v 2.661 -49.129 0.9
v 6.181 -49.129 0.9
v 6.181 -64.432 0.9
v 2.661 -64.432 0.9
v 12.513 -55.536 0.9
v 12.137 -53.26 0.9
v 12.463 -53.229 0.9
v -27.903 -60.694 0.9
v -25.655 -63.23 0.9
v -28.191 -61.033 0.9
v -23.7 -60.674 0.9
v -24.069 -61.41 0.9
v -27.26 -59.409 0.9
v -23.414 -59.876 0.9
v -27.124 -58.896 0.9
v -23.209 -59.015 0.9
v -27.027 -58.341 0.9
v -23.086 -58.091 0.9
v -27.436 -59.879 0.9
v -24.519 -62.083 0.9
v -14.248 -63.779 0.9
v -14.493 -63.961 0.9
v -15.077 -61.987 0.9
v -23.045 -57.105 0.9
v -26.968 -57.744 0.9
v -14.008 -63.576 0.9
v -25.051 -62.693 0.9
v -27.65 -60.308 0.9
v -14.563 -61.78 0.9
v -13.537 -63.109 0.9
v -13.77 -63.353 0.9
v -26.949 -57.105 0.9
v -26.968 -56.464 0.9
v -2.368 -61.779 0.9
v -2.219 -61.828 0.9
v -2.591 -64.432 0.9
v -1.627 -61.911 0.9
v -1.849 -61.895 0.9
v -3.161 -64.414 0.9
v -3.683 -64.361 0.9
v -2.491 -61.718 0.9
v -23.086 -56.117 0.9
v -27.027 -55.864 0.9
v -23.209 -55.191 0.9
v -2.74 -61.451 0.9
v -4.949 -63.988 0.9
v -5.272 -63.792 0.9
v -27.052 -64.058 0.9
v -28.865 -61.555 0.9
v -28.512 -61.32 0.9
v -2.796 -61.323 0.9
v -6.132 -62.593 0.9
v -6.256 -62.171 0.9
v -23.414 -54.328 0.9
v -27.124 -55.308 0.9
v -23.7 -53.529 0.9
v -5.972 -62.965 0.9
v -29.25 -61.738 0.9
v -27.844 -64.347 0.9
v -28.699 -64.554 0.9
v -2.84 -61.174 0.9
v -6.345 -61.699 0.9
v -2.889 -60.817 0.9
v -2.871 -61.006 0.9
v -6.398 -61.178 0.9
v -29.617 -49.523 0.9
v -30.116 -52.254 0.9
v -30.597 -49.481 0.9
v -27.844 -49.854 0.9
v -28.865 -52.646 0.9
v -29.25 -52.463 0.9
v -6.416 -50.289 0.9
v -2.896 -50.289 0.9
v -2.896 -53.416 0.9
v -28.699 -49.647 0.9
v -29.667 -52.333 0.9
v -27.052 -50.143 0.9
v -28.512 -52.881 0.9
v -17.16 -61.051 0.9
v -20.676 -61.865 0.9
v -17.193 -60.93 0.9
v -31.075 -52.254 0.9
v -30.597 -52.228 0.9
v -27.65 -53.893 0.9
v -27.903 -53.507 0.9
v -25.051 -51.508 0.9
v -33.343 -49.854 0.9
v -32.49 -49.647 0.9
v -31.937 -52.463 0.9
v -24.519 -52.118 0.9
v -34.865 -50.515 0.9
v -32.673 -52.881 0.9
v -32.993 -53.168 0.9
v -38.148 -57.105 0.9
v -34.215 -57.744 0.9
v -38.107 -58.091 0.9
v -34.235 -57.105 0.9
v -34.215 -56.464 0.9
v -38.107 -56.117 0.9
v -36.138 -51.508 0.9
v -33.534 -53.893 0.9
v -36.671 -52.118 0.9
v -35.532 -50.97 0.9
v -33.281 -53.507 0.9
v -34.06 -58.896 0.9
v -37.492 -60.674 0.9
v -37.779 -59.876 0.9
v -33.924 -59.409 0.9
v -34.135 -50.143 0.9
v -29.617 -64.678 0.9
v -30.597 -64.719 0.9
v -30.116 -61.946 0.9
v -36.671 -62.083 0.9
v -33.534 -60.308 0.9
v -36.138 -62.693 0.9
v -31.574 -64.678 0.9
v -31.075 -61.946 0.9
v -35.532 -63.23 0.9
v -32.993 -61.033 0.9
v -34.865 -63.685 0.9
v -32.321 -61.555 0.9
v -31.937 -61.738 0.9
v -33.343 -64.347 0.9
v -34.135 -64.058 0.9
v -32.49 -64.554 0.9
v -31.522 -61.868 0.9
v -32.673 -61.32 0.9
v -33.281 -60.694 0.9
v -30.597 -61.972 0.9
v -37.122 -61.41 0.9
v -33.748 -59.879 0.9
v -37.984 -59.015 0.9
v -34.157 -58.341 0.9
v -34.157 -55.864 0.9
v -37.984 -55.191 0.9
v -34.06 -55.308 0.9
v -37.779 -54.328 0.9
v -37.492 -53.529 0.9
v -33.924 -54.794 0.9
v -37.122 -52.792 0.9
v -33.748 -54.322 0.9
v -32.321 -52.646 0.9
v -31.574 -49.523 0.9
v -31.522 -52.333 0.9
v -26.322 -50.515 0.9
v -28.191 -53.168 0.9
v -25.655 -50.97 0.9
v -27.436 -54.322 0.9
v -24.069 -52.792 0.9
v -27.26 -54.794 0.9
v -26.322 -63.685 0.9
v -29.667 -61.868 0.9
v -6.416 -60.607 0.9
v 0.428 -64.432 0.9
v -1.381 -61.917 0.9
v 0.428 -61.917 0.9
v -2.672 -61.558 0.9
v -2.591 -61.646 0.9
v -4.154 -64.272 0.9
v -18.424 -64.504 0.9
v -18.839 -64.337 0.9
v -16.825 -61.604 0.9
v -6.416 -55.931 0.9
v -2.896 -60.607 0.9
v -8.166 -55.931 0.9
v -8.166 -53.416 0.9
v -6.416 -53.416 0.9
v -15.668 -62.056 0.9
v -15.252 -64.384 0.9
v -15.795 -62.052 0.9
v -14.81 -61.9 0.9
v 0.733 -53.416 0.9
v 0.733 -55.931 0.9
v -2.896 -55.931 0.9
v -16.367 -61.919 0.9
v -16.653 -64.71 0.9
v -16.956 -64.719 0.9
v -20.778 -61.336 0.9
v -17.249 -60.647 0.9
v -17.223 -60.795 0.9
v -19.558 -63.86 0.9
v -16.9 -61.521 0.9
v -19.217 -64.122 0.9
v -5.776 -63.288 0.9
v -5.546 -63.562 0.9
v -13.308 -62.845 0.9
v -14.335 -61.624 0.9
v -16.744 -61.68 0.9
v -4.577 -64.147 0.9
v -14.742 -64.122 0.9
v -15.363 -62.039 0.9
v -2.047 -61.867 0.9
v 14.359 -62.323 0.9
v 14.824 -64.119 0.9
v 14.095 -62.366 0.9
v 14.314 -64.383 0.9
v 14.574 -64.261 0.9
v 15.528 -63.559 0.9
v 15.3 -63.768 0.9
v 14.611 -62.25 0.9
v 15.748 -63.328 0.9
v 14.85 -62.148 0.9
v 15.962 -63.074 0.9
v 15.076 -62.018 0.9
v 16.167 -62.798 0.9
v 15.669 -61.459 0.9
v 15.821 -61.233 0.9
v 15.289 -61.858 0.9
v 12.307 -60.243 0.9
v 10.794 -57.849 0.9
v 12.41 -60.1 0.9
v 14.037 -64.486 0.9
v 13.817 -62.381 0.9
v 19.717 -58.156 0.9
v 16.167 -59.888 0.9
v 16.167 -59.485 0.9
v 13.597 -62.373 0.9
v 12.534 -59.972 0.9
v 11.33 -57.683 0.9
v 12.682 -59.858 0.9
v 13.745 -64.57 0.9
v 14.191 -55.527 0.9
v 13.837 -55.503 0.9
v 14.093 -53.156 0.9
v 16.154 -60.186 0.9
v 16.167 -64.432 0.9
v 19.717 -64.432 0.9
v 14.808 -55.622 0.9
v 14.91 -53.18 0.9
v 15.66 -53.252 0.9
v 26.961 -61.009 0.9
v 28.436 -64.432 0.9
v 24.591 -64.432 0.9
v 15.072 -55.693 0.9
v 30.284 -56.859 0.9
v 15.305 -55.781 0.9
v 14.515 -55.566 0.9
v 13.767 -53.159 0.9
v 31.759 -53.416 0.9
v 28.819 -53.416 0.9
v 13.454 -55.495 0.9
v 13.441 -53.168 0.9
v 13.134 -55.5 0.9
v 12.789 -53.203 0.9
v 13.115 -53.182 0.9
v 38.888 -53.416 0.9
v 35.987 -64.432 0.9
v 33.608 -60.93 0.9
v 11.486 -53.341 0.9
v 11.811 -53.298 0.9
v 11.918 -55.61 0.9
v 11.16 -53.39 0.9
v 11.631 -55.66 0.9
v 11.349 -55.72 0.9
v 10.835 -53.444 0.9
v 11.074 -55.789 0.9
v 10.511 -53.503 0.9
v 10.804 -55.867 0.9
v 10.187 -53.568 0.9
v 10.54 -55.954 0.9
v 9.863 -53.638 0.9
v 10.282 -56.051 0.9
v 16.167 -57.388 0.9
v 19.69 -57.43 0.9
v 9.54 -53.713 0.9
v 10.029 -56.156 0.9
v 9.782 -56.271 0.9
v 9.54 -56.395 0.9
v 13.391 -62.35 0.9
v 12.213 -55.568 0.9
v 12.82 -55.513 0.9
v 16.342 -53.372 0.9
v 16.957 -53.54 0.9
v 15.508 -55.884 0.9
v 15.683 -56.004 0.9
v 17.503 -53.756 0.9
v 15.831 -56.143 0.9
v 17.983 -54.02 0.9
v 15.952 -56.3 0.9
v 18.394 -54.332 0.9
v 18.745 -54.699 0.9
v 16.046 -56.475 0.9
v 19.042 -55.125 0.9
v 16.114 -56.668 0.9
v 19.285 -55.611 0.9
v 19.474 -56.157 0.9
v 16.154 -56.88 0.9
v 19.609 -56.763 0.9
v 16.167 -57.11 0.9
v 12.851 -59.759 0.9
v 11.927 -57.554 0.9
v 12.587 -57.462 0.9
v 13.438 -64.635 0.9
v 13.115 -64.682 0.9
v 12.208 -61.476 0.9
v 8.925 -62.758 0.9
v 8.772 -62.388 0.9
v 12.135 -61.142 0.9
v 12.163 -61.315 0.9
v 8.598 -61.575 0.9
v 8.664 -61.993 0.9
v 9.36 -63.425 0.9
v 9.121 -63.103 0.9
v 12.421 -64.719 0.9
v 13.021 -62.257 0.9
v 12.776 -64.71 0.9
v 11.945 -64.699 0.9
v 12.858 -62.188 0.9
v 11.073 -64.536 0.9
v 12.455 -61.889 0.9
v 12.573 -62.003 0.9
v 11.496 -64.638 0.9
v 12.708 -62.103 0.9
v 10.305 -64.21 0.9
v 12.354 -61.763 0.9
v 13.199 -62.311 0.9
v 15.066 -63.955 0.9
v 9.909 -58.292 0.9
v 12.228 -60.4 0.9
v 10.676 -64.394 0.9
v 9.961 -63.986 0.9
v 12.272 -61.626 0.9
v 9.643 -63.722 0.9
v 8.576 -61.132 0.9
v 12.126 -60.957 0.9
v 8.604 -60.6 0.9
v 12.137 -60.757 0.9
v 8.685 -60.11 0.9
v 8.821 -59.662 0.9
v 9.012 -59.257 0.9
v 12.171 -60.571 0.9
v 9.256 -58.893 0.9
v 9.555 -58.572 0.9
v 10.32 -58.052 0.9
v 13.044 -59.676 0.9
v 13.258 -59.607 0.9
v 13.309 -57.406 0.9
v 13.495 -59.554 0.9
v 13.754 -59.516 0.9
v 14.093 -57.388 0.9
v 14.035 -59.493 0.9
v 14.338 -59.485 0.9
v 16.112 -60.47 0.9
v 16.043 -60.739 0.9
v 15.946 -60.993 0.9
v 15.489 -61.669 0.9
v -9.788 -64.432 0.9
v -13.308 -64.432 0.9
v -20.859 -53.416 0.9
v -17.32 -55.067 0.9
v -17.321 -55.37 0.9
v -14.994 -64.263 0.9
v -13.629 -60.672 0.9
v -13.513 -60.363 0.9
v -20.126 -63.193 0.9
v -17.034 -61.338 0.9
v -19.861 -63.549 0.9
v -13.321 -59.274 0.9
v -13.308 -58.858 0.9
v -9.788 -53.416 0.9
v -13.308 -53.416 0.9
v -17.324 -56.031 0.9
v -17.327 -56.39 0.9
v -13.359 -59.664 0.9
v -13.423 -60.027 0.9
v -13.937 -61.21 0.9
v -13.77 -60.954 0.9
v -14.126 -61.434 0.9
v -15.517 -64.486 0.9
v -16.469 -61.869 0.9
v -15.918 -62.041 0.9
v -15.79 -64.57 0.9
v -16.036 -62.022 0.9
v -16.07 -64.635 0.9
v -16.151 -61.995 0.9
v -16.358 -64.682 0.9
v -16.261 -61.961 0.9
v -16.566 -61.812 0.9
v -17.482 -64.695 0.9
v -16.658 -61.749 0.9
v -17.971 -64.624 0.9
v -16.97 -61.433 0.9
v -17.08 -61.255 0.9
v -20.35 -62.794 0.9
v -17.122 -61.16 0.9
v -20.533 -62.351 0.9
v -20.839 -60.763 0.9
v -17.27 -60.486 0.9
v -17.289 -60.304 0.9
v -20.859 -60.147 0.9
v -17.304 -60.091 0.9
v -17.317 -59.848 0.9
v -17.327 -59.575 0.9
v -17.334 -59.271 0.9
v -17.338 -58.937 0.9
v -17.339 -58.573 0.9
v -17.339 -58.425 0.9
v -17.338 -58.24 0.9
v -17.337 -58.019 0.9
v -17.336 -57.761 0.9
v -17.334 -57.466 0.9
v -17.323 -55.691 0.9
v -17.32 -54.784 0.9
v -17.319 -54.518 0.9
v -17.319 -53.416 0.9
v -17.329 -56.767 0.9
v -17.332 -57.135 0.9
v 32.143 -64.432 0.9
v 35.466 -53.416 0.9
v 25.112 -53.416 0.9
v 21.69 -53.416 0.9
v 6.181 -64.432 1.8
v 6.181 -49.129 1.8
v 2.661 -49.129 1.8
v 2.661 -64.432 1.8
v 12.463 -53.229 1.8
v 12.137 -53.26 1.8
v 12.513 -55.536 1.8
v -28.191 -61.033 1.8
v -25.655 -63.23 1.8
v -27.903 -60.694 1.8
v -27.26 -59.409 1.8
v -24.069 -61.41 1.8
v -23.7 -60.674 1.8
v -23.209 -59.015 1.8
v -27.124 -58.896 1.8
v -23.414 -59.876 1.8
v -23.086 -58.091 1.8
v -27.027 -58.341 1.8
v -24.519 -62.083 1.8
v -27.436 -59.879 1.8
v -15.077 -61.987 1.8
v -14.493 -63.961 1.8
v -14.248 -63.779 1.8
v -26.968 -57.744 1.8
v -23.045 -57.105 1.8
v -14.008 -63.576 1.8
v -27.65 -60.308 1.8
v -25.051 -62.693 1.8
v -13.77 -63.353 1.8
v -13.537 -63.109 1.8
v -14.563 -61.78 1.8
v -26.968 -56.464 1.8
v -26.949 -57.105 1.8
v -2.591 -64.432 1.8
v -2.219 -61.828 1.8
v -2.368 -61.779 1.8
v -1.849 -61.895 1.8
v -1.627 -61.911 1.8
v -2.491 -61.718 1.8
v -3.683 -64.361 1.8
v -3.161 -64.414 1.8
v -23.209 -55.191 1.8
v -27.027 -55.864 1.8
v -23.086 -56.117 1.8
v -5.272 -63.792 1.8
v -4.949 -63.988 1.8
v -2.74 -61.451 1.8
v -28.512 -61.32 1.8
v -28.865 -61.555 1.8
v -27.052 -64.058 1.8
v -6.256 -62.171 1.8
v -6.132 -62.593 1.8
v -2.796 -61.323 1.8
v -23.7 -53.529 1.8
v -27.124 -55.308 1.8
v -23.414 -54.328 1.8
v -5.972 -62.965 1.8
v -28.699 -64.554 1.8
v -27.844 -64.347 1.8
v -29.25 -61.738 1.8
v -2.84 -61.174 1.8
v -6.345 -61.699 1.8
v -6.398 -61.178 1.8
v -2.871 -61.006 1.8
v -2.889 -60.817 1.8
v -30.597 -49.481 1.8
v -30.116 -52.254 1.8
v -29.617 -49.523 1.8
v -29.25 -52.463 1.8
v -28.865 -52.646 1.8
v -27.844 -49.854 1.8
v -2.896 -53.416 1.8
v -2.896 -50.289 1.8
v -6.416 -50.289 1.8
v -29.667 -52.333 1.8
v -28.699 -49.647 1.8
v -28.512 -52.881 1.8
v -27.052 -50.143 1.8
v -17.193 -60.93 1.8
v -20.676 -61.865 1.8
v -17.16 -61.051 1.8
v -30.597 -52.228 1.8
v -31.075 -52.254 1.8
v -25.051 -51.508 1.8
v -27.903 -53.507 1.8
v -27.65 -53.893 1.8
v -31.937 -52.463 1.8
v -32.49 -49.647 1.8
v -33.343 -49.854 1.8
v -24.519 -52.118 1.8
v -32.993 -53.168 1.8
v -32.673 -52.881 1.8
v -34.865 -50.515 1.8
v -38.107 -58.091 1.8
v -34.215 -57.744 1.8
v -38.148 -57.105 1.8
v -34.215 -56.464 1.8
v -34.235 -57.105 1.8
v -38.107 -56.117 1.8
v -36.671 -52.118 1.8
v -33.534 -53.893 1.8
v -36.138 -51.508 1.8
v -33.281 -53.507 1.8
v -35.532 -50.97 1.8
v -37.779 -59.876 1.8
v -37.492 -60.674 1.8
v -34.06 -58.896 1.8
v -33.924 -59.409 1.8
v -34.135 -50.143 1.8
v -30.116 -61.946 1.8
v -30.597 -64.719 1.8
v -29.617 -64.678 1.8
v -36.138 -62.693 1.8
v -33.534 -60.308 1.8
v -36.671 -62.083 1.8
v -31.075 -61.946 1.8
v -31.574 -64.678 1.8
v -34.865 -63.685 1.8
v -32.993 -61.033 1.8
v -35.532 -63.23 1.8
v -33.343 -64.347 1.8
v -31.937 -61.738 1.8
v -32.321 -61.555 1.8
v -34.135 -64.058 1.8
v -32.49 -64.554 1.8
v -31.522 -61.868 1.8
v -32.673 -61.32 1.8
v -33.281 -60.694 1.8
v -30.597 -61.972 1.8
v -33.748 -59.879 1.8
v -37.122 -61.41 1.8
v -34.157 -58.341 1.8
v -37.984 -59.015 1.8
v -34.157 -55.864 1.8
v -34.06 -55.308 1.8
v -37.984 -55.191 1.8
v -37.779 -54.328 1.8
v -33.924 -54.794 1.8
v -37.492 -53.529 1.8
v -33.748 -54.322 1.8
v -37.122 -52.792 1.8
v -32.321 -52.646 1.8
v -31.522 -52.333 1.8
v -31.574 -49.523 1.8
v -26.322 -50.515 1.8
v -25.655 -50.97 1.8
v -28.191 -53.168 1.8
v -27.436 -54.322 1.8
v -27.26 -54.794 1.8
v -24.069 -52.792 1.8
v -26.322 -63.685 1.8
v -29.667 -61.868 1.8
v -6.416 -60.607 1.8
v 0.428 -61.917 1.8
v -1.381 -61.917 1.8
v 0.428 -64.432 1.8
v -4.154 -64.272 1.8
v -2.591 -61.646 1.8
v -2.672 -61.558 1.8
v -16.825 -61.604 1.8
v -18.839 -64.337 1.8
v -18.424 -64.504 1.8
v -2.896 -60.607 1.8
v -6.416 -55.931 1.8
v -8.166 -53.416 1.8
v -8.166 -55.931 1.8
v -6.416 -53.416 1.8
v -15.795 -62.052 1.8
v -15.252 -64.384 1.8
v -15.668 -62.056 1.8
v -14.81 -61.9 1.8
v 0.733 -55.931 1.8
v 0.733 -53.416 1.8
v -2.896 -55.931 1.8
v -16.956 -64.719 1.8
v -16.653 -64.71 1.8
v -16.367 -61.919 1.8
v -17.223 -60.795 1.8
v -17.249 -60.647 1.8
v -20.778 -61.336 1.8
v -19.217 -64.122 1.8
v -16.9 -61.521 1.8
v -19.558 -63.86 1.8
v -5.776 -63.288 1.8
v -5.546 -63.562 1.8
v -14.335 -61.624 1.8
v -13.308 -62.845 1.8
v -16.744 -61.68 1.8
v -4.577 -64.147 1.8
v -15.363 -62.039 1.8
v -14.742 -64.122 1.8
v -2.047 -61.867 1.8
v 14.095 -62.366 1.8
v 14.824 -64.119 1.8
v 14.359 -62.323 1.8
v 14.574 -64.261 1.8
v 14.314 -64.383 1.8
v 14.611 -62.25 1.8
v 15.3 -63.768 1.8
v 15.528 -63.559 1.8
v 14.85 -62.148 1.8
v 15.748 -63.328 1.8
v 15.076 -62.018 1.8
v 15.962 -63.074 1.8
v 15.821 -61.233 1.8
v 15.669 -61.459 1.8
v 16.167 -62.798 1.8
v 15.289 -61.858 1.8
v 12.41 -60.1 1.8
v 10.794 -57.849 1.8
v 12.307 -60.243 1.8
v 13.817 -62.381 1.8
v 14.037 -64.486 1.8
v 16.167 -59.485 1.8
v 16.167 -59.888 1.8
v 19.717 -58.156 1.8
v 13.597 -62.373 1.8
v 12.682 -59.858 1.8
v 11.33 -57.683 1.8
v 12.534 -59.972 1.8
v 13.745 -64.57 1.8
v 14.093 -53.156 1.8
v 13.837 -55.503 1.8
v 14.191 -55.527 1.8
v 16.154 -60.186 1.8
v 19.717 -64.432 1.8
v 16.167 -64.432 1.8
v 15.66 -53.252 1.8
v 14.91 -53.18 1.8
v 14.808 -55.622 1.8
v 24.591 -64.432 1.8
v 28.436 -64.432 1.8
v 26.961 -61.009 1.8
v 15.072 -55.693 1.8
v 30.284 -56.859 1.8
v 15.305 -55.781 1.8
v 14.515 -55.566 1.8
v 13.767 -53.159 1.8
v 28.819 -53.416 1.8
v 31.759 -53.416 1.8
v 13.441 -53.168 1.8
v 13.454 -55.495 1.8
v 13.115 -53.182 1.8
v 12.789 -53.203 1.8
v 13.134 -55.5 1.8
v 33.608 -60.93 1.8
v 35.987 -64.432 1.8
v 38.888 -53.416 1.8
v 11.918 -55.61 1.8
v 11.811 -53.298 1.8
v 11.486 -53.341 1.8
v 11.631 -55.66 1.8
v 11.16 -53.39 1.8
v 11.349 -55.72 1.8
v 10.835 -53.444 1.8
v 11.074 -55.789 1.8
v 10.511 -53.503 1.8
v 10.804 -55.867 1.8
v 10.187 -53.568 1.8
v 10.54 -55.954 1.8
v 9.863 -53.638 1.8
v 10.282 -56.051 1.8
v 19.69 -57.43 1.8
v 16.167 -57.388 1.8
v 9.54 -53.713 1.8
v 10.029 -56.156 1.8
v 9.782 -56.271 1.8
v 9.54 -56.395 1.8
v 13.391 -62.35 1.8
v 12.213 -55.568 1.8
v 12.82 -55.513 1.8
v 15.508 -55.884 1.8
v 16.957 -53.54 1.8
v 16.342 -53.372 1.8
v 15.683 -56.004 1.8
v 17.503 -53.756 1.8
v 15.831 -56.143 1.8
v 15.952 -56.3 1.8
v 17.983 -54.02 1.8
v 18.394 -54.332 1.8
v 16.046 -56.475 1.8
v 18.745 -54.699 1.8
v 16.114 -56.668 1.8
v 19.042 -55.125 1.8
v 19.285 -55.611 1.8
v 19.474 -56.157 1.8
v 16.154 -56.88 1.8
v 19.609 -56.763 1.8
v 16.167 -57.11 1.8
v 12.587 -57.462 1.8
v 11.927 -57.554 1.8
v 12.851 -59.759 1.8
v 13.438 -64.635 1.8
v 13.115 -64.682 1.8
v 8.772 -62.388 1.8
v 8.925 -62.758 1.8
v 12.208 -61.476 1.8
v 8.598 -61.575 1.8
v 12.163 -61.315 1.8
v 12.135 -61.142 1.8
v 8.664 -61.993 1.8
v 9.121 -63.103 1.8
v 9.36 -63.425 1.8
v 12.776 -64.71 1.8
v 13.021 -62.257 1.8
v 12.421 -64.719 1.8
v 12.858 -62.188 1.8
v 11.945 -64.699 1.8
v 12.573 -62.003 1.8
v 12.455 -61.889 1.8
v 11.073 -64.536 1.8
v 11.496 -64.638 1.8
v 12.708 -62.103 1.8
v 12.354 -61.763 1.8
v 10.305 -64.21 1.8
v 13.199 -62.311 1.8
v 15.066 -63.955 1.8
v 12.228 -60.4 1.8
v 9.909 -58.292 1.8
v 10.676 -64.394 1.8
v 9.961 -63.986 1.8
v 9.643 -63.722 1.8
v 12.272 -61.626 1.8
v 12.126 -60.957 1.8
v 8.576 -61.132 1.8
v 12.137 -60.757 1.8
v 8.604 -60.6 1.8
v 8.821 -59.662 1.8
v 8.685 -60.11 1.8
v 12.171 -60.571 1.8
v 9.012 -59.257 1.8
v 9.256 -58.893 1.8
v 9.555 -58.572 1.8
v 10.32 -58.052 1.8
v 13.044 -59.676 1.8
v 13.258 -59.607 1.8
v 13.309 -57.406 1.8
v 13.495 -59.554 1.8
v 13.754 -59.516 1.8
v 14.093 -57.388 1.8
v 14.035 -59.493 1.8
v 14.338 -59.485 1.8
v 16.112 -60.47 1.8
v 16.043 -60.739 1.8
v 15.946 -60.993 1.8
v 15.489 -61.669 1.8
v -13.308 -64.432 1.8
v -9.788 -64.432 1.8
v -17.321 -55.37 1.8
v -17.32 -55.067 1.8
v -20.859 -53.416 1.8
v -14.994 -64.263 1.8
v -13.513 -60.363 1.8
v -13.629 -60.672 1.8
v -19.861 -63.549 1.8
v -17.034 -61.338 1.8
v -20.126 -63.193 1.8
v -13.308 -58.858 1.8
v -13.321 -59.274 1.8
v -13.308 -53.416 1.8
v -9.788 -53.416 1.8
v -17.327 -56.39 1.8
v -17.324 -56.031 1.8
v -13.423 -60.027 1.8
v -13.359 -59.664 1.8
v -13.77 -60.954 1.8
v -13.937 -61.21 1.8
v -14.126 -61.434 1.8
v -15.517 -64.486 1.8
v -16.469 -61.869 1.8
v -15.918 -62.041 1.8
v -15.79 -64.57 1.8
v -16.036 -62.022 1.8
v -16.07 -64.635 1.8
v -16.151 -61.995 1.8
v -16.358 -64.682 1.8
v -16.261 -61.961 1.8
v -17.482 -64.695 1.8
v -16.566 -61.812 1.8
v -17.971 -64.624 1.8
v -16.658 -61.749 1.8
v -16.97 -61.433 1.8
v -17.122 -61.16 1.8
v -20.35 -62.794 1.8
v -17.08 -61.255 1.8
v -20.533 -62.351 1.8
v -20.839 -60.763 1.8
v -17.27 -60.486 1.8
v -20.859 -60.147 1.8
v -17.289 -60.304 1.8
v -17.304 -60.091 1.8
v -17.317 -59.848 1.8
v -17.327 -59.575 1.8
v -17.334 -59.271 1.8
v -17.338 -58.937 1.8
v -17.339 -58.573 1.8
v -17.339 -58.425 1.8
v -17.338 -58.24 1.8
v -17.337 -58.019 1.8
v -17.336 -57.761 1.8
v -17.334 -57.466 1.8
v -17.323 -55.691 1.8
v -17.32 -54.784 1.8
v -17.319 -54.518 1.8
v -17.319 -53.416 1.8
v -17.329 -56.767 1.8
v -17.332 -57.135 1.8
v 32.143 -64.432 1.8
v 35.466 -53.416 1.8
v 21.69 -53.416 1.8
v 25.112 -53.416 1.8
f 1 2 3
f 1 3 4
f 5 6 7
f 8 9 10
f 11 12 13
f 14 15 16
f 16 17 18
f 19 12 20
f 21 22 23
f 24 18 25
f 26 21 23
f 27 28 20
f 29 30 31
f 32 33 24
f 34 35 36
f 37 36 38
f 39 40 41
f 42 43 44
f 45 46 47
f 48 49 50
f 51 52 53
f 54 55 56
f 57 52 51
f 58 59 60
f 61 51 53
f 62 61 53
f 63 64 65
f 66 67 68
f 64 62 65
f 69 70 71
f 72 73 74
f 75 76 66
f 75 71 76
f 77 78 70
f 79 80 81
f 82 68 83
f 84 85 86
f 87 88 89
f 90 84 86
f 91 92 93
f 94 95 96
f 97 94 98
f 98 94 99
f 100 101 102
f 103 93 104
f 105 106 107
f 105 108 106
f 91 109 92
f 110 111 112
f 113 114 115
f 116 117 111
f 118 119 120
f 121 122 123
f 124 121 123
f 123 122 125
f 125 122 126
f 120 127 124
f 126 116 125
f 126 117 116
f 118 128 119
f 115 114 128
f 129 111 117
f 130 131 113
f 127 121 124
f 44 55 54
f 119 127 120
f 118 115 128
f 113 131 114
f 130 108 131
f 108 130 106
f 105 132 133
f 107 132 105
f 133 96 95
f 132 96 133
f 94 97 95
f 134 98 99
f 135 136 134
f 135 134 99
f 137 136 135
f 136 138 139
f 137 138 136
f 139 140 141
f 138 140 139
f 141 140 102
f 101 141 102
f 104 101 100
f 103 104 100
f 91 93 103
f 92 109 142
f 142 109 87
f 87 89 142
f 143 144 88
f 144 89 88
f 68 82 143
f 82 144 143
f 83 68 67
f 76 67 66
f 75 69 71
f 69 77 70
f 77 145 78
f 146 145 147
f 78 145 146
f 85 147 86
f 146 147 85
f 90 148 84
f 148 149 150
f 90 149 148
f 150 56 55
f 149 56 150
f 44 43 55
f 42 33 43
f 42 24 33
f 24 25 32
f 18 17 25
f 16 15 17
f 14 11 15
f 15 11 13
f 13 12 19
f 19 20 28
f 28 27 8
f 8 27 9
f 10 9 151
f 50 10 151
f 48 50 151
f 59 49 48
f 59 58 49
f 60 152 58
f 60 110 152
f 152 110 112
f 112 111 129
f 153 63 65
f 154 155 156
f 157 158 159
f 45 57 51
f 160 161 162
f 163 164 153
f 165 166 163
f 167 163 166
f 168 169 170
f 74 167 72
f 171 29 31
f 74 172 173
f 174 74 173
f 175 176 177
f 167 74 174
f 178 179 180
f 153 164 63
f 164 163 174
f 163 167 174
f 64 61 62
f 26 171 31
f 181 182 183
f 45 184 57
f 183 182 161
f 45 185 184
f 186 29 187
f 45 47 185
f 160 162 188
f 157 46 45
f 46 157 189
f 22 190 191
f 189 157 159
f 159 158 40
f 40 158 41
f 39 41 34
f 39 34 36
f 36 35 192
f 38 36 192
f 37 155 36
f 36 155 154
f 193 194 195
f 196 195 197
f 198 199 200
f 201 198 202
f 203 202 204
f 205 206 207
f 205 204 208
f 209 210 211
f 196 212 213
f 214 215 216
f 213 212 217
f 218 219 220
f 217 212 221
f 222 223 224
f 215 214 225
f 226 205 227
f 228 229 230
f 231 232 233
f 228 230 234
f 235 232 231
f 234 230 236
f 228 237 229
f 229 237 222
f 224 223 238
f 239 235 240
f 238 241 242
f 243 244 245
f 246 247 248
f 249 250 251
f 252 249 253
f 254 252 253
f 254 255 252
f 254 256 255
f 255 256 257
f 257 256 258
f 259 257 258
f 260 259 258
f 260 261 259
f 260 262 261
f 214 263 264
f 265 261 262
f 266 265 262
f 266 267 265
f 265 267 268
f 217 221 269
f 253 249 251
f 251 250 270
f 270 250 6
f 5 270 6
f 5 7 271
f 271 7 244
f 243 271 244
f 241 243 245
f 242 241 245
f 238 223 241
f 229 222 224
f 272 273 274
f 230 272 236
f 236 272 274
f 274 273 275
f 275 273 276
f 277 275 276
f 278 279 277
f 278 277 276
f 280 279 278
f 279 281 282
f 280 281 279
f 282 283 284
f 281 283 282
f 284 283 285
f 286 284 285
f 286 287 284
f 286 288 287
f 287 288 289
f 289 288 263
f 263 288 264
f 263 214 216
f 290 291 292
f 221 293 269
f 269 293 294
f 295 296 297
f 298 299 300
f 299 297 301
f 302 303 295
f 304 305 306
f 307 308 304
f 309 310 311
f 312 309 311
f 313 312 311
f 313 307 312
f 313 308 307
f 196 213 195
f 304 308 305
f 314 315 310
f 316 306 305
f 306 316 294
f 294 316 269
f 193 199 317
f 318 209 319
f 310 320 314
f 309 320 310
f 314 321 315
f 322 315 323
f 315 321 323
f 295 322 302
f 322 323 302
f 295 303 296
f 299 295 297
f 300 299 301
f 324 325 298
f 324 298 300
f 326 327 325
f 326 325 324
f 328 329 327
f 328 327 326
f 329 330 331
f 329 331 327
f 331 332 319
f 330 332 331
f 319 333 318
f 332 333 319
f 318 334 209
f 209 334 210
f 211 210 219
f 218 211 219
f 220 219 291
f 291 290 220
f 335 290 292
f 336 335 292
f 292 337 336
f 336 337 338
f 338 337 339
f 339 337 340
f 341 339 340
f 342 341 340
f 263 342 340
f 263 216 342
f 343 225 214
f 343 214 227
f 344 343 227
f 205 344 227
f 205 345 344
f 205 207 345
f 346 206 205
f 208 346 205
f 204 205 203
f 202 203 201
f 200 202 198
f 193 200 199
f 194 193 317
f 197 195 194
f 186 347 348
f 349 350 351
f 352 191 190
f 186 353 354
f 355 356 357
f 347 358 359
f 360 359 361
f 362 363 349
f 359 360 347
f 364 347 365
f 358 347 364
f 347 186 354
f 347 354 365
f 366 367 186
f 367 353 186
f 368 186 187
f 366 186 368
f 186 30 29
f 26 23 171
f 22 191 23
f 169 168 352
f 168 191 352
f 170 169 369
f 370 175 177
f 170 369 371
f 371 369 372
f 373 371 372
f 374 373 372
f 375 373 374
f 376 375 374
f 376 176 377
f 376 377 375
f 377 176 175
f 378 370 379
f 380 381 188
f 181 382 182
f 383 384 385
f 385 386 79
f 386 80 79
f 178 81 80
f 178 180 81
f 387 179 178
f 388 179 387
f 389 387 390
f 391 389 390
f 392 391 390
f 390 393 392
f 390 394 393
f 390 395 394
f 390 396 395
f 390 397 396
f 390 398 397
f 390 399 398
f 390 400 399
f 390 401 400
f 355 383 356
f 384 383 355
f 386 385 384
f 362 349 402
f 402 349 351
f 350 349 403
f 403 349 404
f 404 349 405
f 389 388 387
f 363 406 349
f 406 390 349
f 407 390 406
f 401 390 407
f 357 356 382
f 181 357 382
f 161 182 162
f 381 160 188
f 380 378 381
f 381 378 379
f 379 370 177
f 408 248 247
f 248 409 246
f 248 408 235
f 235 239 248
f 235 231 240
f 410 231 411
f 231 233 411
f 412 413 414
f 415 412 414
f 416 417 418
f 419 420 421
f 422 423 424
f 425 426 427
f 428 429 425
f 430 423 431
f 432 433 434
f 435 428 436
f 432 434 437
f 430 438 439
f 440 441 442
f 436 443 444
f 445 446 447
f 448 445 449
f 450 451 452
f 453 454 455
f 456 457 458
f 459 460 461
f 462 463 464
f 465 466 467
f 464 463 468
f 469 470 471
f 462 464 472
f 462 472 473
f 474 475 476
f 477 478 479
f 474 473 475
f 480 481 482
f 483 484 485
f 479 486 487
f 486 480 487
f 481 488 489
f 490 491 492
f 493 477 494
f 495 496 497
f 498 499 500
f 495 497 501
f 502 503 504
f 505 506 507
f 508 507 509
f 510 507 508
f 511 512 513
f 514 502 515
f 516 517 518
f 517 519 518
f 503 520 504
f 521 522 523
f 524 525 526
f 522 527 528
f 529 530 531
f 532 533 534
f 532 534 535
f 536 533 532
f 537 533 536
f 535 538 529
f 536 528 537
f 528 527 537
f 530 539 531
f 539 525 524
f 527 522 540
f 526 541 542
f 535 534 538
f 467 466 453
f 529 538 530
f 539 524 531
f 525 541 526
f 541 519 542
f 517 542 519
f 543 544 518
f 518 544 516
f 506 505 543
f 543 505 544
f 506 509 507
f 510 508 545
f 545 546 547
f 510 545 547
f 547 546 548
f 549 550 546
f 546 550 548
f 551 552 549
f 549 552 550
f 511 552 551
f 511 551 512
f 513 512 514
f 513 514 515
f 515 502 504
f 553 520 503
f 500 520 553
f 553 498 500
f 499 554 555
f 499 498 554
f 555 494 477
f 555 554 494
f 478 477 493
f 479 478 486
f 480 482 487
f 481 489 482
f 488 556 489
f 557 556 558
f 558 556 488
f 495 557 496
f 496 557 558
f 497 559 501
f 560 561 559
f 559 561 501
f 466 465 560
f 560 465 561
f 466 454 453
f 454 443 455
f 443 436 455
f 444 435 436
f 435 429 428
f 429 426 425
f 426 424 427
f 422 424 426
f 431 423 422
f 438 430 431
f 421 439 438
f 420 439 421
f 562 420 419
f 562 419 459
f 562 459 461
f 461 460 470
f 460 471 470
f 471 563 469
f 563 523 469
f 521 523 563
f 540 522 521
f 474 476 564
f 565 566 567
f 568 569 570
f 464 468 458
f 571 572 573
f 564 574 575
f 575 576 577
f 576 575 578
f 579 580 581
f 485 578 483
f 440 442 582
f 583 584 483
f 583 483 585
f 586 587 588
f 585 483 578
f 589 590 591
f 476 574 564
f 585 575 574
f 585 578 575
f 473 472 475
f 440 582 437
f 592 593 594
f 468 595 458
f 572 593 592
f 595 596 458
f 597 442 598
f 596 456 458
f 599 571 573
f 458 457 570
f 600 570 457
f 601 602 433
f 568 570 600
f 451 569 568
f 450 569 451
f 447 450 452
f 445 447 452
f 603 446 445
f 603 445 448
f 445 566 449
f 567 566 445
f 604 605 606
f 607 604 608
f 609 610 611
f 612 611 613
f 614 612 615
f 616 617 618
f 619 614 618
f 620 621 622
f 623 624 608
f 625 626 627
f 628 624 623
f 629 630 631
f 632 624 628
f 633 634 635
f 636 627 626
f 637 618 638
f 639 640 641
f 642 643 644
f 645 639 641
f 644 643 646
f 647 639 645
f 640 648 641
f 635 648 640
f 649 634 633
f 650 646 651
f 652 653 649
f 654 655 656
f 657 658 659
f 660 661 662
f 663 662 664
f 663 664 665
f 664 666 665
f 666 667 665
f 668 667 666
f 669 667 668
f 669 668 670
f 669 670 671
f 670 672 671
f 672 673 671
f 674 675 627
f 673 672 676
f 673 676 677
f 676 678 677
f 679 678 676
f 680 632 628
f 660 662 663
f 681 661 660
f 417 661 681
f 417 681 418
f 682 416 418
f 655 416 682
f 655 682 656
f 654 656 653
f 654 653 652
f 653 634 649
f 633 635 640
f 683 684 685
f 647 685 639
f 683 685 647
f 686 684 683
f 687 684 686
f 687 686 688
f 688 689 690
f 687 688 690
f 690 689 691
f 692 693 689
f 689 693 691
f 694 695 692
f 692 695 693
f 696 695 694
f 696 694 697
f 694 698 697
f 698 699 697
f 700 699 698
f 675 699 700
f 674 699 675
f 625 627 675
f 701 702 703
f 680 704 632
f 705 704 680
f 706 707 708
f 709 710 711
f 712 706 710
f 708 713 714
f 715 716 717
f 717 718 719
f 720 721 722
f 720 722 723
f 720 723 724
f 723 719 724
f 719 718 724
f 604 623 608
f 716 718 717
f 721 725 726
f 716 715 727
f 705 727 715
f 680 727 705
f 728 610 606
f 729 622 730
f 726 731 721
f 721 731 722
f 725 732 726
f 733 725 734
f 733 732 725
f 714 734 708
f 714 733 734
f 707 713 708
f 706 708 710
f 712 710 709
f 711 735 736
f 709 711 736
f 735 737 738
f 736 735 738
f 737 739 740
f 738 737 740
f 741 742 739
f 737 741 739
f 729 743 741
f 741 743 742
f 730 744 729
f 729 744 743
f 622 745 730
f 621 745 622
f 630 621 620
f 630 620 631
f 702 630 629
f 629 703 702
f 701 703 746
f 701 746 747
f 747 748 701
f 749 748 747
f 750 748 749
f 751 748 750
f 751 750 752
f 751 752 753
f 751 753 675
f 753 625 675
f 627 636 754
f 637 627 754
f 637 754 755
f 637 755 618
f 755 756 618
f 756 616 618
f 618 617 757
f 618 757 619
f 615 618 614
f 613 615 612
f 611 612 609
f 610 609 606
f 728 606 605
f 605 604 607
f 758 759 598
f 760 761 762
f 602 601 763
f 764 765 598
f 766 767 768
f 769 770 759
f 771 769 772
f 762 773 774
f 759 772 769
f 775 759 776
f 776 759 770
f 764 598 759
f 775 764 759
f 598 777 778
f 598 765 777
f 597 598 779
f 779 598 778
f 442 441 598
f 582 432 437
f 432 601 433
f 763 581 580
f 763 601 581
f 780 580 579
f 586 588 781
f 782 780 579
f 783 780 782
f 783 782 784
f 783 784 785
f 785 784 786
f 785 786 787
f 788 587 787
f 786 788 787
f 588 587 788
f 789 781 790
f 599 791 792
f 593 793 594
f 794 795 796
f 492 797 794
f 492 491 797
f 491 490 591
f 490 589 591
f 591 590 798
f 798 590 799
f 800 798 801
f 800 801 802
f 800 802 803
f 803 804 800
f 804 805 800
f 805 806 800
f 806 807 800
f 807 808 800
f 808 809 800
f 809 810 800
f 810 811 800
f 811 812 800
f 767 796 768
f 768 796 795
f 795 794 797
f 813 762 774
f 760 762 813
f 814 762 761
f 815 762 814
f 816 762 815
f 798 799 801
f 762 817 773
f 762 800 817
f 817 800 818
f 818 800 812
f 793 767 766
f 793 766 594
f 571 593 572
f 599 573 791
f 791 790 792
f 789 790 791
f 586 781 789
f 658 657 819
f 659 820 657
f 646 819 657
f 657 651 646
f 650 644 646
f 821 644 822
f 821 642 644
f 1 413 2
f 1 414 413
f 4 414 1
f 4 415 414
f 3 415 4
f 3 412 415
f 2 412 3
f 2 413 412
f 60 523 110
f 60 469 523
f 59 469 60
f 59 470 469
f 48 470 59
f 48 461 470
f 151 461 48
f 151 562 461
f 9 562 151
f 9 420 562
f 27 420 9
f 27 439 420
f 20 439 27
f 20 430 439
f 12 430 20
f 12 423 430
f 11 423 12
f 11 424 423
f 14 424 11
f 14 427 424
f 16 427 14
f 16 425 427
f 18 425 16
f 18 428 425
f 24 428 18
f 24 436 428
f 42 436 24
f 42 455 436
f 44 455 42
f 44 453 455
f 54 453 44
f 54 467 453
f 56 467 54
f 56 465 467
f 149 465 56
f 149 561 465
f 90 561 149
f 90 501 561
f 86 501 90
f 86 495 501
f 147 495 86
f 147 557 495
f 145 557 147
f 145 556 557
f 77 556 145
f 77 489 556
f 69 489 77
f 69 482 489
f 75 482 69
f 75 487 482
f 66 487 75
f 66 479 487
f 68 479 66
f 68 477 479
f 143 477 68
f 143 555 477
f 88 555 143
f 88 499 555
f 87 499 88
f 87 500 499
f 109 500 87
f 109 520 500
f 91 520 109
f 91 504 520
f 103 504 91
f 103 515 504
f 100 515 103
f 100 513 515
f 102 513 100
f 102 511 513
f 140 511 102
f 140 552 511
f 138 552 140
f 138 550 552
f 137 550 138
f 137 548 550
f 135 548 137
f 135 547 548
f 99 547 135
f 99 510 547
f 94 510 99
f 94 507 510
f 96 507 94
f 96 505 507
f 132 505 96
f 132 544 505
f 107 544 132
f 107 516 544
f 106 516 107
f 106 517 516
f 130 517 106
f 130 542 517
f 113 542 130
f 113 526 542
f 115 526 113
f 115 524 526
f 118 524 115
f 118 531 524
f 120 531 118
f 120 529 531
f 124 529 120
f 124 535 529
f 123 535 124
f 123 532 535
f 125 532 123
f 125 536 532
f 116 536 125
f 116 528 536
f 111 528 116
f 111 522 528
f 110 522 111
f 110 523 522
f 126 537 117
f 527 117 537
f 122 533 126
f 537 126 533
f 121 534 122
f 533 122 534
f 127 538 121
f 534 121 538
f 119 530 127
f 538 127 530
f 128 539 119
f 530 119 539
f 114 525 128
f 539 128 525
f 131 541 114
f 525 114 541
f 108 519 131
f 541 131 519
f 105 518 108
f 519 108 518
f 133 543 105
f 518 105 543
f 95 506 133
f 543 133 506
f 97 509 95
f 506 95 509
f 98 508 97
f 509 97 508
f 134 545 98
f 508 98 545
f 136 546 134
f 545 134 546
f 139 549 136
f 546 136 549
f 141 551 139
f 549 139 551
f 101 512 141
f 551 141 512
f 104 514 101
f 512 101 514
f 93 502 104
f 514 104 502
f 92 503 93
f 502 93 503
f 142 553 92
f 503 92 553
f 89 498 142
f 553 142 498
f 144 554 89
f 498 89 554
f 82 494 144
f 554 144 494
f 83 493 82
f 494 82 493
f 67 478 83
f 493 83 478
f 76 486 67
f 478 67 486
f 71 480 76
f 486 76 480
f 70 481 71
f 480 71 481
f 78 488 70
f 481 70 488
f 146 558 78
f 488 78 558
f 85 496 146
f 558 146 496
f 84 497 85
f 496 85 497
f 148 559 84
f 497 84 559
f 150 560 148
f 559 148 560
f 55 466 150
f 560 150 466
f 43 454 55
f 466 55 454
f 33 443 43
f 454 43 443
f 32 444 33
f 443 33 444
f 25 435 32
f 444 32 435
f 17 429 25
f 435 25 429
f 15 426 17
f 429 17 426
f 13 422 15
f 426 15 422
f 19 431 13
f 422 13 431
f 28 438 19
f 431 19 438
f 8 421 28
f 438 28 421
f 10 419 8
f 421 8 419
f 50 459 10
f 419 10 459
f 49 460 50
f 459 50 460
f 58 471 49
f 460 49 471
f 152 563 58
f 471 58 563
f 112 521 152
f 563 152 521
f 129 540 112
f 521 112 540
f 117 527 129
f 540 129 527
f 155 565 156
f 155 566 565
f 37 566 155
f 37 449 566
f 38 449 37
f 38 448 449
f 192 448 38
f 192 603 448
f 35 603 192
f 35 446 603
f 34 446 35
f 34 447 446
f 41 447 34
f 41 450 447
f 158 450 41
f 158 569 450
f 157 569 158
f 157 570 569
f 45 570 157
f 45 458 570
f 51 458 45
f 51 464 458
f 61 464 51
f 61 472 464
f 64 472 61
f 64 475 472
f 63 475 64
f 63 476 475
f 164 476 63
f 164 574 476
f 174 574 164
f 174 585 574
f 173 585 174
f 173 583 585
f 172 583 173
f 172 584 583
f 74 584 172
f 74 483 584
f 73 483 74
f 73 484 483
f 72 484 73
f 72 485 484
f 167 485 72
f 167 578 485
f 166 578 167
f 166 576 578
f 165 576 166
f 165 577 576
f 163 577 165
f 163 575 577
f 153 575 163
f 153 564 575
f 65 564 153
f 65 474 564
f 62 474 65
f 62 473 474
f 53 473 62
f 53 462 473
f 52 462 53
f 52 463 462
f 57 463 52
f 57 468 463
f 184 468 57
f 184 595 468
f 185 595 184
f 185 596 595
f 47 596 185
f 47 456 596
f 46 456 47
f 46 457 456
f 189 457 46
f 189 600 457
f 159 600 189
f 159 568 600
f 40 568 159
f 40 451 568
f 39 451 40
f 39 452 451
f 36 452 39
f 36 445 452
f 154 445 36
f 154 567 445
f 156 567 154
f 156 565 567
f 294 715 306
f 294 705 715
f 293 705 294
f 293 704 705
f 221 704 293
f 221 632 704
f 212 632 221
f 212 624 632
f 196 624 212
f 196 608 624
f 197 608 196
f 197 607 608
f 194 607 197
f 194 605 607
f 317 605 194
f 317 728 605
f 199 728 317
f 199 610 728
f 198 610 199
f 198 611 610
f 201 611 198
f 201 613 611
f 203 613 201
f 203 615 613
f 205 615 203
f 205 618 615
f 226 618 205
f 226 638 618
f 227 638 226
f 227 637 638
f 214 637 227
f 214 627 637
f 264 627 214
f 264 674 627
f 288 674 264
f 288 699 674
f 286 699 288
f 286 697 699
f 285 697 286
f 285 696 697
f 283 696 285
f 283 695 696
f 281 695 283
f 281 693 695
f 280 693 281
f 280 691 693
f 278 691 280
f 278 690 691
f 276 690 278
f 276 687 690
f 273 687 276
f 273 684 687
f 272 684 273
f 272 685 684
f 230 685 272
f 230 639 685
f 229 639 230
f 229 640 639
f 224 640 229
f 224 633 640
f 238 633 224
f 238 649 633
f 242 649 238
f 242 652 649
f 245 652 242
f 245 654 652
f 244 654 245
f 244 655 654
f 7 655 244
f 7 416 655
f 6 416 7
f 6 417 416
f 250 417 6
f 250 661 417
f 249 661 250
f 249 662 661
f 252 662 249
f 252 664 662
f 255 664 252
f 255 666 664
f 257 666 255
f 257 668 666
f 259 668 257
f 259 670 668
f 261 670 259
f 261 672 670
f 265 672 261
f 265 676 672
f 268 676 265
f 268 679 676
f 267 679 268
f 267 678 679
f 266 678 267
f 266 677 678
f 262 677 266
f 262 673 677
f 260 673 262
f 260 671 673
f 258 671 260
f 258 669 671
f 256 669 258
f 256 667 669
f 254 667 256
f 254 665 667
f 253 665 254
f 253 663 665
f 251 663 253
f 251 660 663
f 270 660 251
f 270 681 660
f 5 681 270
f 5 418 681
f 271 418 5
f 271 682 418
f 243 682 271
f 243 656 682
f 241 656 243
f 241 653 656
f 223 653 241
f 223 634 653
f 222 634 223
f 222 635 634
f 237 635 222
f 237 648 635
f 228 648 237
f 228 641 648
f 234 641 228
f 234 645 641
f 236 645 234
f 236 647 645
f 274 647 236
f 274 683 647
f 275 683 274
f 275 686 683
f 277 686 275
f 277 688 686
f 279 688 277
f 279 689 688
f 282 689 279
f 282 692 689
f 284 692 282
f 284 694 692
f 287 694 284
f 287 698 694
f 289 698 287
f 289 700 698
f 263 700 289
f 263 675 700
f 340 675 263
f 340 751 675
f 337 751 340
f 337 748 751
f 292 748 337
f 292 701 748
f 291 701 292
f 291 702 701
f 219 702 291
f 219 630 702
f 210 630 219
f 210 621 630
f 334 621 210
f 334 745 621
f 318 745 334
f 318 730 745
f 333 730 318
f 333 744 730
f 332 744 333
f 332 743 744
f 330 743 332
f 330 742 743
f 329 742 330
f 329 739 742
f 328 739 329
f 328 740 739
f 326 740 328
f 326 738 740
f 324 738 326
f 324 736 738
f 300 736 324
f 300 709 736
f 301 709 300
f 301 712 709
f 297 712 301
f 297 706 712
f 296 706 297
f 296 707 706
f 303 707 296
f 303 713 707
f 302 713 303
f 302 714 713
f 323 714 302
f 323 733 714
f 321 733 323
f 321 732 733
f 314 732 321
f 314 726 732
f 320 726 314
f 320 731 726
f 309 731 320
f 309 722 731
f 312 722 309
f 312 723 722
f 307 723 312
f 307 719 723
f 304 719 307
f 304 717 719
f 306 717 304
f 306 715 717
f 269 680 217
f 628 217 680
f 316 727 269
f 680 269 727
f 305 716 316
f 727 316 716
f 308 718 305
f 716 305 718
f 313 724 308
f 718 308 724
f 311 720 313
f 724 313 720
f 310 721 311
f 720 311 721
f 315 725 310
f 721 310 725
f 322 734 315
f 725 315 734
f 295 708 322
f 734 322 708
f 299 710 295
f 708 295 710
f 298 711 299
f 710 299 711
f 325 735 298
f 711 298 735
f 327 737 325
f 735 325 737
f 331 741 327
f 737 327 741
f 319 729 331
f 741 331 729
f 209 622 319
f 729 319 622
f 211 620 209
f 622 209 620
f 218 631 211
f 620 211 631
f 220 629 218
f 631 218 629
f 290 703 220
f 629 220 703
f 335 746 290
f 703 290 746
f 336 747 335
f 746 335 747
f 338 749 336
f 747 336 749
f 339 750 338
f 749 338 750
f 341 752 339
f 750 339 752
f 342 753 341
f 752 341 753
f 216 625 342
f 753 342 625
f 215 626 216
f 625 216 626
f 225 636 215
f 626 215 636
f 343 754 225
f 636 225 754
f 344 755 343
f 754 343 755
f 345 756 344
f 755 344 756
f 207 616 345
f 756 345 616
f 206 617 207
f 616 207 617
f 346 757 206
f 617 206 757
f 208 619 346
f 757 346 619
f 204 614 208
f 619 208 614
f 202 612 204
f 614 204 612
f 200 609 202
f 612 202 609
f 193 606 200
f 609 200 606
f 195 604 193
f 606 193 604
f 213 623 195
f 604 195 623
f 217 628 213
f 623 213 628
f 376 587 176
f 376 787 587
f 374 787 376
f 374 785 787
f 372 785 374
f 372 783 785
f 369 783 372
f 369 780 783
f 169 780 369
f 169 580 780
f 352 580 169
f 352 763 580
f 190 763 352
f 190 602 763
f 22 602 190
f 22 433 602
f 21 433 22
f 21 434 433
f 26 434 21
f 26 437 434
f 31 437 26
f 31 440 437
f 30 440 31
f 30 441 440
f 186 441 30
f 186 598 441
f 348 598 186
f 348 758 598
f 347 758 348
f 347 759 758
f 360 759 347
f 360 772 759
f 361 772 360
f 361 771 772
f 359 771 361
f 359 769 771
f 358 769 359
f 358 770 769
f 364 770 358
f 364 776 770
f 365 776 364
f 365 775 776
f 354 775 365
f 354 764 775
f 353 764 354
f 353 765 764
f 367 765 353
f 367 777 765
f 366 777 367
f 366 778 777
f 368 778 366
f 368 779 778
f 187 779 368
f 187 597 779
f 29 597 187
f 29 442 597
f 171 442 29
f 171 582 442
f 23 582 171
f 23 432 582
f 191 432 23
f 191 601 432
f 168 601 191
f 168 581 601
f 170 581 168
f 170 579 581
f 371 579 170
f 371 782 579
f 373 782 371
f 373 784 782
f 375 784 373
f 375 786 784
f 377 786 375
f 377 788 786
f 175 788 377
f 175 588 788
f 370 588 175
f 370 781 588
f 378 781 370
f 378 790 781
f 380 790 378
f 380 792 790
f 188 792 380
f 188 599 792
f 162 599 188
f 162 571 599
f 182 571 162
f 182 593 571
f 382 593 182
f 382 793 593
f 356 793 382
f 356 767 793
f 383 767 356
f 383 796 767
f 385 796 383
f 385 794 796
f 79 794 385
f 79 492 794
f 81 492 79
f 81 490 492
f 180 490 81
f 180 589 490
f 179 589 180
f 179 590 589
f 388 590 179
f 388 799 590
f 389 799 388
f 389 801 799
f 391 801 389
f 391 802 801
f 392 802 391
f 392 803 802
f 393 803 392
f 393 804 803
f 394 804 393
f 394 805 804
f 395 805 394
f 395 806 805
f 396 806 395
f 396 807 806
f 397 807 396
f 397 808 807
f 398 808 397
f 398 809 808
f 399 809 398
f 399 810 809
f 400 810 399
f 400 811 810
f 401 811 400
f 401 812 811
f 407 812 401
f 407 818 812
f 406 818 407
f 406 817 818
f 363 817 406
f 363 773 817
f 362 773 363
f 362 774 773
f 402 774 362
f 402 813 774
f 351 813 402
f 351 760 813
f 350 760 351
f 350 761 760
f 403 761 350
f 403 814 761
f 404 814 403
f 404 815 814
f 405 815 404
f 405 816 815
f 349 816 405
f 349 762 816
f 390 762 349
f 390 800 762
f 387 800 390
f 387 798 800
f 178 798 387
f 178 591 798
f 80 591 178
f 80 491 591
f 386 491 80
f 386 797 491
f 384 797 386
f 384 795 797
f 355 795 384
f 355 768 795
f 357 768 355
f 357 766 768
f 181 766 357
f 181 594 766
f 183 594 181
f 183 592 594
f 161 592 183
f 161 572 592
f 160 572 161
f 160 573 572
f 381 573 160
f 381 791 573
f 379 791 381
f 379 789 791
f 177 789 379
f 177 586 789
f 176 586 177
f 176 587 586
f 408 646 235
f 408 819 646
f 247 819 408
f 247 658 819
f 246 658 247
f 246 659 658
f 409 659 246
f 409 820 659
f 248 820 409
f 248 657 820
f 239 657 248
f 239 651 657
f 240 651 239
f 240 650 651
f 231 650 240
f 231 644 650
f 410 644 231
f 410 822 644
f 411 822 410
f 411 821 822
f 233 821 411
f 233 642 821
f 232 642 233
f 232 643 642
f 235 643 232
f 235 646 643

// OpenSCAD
$fn = 48;
  // English (below bottom hole)
  translate([0, -57.100, 0.900]) linear_extrude(height=0.900) text("Outlaw", size=14.500, halign="center", valign="center", font="Helvetica Neue:style=Bold");
